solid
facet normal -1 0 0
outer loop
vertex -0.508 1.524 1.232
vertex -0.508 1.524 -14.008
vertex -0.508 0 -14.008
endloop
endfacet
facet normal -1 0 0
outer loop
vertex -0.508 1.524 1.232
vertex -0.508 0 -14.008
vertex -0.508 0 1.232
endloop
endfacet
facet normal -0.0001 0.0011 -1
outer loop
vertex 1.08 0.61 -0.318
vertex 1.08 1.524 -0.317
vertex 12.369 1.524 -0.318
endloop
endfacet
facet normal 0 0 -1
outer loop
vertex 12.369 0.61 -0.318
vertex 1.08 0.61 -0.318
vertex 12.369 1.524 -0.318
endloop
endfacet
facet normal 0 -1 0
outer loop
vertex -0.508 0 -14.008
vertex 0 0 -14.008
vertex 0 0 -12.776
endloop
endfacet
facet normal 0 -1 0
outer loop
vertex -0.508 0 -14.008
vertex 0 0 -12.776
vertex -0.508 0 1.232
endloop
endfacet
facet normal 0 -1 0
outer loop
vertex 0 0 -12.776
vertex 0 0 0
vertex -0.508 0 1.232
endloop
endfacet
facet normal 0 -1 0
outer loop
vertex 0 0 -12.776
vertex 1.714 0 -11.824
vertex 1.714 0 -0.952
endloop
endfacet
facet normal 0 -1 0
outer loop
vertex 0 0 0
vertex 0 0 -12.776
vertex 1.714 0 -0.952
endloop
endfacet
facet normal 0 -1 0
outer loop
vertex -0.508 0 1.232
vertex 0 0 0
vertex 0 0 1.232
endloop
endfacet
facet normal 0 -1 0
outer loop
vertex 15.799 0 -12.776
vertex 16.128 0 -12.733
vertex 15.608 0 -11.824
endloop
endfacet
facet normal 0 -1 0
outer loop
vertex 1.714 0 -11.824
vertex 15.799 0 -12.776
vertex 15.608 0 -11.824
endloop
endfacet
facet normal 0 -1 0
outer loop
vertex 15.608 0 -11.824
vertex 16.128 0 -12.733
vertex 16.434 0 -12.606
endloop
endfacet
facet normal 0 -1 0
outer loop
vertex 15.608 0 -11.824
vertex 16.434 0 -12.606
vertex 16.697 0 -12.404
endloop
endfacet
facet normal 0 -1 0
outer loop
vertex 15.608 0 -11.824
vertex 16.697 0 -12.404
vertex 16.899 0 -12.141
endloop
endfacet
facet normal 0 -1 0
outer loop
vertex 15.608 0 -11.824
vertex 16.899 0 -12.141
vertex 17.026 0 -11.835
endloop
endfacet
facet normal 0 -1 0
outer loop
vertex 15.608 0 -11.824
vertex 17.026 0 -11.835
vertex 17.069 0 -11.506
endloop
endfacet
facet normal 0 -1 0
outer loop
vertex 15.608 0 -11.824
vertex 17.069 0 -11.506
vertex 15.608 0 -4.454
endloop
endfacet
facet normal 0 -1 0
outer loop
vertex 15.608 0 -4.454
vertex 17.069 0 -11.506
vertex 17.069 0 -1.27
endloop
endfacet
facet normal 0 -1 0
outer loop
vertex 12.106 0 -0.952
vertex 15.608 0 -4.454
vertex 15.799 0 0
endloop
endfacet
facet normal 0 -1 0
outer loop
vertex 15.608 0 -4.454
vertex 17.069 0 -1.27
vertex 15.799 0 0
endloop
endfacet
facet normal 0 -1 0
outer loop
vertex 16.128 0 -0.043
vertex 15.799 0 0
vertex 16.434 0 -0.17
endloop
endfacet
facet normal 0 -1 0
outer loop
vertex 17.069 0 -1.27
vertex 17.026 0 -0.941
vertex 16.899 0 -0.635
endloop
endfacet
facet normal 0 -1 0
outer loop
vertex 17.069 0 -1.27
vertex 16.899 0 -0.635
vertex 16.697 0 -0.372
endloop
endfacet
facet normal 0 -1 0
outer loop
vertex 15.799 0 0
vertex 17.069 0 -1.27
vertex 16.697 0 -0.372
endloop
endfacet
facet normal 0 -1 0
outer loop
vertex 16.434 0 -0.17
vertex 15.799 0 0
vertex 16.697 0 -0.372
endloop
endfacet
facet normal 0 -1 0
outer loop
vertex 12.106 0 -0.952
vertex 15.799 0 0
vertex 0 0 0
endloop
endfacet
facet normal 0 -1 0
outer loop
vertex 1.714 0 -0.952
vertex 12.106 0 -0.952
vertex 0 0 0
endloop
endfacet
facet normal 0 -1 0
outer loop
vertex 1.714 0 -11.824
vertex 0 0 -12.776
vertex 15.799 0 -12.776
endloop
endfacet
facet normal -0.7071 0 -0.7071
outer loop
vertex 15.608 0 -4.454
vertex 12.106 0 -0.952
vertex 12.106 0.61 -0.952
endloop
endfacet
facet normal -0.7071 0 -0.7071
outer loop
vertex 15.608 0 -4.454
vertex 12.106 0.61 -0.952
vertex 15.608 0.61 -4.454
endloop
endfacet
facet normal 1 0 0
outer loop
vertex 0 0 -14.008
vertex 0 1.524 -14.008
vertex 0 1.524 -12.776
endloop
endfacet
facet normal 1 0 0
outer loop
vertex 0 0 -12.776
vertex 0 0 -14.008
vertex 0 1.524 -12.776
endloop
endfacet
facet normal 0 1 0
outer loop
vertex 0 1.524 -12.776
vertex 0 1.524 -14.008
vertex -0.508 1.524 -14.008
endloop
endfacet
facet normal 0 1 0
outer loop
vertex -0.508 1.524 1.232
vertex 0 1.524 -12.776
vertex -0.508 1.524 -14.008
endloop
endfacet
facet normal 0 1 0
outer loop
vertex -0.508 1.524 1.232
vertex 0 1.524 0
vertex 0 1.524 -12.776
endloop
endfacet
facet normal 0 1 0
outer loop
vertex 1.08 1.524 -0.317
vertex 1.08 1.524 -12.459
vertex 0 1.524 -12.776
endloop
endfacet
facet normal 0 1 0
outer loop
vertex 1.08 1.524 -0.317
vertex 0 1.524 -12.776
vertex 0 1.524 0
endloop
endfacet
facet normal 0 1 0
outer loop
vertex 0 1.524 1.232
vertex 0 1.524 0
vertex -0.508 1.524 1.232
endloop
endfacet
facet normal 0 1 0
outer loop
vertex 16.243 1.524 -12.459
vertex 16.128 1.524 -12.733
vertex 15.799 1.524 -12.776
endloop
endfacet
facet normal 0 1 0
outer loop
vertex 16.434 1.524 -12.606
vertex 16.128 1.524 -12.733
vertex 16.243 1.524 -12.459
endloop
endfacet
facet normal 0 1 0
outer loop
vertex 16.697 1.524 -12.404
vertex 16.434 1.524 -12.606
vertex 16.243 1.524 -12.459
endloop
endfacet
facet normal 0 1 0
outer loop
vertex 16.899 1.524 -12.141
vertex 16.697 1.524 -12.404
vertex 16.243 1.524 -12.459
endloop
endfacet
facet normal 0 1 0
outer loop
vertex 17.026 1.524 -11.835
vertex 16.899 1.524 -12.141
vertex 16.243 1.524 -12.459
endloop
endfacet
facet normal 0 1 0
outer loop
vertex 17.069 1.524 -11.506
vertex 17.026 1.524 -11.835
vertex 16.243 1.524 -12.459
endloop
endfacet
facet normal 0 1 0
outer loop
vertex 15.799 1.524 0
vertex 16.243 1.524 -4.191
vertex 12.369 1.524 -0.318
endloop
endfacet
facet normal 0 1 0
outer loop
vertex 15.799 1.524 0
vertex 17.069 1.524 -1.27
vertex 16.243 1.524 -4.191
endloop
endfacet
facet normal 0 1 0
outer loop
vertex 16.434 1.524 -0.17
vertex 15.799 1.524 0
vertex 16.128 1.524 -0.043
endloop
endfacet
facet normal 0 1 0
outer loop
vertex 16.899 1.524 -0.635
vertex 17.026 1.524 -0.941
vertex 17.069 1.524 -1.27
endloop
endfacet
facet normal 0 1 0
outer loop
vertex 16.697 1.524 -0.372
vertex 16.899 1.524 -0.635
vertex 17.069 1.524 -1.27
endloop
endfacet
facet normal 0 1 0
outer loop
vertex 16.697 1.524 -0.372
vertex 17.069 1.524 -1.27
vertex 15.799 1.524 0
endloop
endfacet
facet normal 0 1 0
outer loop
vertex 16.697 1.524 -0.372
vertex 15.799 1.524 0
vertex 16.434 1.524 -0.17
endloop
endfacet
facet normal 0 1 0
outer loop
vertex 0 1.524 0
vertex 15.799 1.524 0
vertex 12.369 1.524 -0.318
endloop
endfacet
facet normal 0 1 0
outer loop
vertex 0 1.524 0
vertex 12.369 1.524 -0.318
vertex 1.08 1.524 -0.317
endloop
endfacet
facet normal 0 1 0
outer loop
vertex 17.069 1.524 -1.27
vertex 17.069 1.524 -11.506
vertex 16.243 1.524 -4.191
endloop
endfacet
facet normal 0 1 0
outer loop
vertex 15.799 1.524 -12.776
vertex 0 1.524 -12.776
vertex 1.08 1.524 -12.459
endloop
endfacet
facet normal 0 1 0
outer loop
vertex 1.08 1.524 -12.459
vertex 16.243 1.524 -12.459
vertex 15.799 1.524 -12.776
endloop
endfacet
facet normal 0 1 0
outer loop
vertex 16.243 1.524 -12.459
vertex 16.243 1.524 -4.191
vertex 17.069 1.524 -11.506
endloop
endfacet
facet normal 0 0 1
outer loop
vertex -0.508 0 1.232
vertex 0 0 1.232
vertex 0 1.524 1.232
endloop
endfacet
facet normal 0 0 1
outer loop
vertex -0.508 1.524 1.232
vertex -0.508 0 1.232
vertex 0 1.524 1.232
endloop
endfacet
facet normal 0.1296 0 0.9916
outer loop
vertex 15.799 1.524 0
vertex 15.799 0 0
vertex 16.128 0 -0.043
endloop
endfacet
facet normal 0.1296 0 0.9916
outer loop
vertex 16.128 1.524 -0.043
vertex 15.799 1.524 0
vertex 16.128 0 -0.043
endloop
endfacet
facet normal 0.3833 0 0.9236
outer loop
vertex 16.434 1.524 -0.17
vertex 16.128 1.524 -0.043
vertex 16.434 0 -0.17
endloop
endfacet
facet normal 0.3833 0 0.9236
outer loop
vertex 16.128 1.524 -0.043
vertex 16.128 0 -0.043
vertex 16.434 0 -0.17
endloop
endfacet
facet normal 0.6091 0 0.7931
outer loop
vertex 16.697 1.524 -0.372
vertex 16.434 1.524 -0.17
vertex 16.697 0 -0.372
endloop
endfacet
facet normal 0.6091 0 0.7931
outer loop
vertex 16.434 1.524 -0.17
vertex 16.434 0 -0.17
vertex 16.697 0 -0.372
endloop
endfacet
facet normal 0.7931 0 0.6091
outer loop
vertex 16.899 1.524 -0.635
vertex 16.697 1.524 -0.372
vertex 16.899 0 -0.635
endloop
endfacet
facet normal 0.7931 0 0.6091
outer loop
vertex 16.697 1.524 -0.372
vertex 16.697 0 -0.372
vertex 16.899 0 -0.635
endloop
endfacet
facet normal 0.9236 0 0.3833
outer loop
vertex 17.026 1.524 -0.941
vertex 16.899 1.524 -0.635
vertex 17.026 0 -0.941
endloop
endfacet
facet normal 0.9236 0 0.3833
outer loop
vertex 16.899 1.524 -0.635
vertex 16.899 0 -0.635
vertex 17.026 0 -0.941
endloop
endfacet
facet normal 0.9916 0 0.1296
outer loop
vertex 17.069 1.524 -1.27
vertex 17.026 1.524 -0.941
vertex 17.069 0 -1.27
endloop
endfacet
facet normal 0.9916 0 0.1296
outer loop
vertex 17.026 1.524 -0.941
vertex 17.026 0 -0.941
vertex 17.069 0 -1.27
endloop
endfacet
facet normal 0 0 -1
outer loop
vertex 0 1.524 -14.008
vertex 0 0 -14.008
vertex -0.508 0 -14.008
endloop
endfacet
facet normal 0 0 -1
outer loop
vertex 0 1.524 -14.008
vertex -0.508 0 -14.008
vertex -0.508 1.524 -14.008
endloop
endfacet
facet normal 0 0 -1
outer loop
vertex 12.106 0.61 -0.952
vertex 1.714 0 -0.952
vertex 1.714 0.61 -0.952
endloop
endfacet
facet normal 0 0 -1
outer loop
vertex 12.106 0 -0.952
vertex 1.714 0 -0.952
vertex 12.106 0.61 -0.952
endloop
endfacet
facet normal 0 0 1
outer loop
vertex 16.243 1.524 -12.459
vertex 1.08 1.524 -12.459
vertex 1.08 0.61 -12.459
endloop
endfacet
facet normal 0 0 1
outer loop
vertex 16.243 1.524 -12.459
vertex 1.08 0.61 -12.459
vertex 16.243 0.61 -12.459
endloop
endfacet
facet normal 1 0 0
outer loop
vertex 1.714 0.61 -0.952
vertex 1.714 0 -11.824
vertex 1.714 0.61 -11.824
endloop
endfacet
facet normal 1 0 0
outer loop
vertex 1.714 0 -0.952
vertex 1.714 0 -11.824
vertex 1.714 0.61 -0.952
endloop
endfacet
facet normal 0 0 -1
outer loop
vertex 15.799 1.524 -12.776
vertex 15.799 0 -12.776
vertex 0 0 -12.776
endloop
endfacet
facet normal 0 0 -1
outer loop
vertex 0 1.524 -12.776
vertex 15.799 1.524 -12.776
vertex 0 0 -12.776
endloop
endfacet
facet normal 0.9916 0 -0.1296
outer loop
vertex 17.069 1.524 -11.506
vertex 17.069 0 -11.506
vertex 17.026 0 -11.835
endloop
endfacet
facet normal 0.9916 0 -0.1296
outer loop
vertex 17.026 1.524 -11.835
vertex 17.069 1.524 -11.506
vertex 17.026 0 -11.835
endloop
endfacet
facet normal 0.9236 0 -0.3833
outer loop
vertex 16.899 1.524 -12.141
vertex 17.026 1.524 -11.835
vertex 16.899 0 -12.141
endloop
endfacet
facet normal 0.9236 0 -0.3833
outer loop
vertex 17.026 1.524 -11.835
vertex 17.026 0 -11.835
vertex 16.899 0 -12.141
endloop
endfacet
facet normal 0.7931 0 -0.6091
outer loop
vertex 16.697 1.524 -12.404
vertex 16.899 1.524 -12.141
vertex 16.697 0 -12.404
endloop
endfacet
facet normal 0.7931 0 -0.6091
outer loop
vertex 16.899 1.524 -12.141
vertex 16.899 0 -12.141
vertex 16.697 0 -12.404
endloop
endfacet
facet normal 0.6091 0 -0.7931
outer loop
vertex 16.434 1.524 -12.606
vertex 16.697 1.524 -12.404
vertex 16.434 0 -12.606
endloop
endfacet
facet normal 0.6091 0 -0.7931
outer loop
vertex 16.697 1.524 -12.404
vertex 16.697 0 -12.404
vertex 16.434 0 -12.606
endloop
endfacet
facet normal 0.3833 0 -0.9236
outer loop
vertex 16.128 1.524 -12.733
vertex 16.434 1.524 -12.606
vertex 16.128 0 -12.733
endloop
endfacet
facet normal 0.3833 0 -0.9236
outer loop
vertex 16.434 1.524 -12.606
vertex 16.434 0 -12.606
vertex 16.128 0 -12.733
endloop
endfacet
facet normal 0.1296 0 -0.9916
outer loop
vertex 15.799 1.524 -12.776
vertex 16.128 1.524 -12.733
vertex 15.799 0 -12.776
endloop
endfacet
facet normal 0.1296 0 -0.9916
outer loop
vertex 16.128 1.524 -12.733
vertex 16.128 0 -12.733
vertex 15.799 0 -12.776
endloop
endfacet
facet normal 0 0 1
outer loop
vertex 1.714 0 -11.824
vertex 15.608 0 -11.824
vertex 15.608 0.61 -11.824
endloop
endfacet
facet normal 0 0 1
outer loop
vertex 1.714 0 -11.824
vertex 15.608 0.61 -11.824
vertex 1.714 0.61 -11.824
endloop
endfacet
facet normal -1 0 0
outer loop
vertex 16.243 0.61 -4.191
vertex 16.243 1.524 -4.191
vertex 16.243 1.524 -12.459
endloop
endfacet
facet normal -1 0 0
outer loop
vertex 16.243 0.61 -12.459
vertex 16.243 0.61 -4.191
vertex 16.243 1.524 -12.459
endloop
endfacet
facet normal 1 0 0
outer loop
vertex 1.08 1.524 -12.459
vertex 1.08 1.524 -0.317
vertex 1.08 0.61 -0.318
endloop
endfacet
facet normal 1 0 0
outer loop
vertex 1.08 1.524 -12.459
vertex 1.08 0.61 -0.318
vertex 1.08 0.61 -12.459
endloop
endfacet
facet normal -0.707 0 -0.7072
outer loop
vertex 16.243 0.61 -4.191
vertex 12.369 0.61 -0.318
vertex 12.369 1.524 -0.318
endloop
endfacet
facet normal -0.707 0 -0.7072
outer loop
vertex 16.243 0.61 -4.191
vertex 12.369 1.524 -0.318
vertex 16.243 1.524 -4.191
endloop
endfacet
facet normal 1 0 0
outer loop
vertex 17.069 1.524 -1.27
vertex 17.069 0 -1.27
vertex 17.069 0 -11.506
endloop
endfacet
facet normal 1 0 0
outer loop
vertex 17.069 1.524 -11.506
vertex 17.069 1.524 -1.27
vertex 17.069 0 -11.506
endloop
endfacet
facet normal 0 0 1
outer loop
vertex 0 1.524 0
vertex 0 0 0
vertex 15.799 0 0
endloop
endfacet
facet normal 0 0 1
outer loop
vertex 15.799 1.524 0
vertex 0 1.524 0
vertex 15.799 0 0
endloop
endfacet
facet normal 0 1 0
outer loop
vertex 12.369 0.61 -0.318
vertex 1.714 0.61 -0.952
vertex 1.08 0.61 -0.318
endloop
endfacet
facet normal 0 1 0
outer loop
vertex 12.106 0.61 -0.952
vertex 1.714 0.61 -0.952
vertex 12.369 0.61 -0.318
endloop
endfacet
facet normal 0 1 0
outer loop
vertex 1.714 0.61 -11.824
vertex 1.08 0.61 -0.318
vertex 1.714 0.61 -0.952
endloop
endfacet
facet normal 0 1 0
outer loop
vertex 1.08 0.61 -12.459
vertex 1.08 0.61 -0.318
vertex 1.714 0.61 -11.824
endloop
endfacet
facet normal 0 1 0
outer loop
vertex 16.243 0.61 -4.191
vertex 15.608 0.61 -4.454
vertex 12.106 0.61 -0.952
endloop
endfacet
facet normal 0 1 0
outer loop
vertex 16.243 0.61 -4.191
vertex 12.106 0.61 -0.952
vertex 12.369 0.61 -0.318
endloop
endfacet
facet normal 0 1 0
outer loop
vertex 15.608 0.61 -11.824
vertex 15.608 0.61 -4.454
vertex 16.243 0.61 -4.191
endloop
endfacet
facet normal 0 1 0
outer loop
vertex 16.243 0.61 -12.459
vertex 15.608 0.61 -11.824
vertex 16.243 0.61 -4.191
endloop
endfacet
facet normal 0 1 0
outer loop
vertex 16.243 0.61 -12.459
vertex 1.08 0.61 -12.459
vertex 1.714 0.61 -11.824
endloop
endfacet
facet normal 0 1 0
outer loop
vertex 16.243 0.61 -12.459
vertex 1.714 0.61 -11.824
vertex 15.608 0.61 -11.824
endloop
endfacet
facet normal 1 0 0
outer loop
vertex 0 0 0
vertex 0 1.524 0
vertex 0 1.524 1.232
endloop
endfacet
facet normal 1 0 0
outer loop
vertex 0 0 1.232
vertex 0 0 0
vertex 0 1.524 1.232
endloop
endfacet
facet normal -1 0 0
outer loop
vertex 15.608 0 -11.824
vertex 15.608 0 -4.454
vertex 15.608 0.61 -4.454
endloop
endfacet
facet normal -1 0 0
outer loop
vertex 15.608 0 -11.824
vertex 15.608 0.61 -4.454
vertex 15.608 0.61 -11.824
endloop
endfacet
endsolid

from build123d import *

# Parameters (mm, degrees)
BOSS_EXTRUDE1_DEPTH = 1.524
SKETCH2_W           = 15.1638
SKETCH2_H           = 12.1412
CUT_EXTRUDE1_DEPTH  = 22.375167739
BOSS_EXTRUDE2_DEPTH = 1.524
BOSS_EXTRUDE3_DEPTH = 0.6096
SKETCH7_W           = 15.24
SKETCH7_H           = 1.524
BOSS_EXTRUDE4_DEPTH = 0.508


with BuildPart() as part:
    # Sketch1 → Boss-Extrude1 (new body)
    with BuildSketch(Plane(origin=(0, 0, 0), x_dir=(1, 0, 0), z_dir=(0, 1, 0))):
        with BuildLine():
            Line((0, 0), (15.7988, 0))
            ThreePointArc((15.7988, 0), (16.696825612, 0.371974388), (17.0688, 1.27))
            Line((17.0688, 1.27), (17.0688, 11.5062))
            ThreePointArc((17.0688, 11.5062), (16.696825612, 12.404225612), (15.7988, 12.7762))
            Line((15.7988, 12.7762), (0, 12.7762))
            Line((0, 12.7762), (0, 0))
        make_face()
    extrude(amount=BOSS_EXTRUDE1_DEPTH)

    # Sketch2 → Cut-Extrude1 (cut, through all)
    with BuildSketch(Plane(origin=(0, 1.524, 0), x_dir=(1, 0, 0), z_dir=(0, 1, 0))):
        with Locations((8.6614, 6.3881)):
            Rectangle(SKETCH2_W, SKETCH2_H)
    extrude(amount=-CUT_EXTRUDE1_DEPTH, mode=Mode.SUBTRACT)

    # Sketch3 → Boss-Extrude2 (add)
    with BuildSketch(Plane(origin=(0, 0, 0), x_dir=(1, 0, 0), z_dir=(0, 1, 0))):
        Polygon((12.369415055, 0.3175), (16.2433, 4.191384945), (16.2433, 0.3175), align=None)
    extrude(amount=BOSS_EXTRUDE2_DEPTH)

    # Sketch5 → Boss-Extrude3 (add)
    with BuildSketch(Plane(origin=(0, 0, 0), x_dir=(1, 0, 0), z_dir=(0, 1, 0))):
        Polygon((1.0795, 0.3175), (12.369415055, 0.3175), (16.2433, 4.191384945), (16.2433, 12.4587), (1.0795, 12.4587), align=None)
        Polygon((1.7145, 11.8237), (1.7145, 0.9525), (12.106389443, 0.9525), (15.6083, 4.454410557), (15.6083, 11.8237), align=None, mode=Mode.SUBTRACT)
    extrude(amount=BOSS_EXTRUDE3_DEPTH)

    # Sketch7 → Boss-Extrude4 (add)
    with BuildSketch(Plane.ZY):
        with Locations((-6.3881, 0.762)):
            Rectangle(SKETCH7_W, SKETCH7_H)
    extrude(amount=BOSS_EXTRUDE4_DEPTH)


solid = part.part
